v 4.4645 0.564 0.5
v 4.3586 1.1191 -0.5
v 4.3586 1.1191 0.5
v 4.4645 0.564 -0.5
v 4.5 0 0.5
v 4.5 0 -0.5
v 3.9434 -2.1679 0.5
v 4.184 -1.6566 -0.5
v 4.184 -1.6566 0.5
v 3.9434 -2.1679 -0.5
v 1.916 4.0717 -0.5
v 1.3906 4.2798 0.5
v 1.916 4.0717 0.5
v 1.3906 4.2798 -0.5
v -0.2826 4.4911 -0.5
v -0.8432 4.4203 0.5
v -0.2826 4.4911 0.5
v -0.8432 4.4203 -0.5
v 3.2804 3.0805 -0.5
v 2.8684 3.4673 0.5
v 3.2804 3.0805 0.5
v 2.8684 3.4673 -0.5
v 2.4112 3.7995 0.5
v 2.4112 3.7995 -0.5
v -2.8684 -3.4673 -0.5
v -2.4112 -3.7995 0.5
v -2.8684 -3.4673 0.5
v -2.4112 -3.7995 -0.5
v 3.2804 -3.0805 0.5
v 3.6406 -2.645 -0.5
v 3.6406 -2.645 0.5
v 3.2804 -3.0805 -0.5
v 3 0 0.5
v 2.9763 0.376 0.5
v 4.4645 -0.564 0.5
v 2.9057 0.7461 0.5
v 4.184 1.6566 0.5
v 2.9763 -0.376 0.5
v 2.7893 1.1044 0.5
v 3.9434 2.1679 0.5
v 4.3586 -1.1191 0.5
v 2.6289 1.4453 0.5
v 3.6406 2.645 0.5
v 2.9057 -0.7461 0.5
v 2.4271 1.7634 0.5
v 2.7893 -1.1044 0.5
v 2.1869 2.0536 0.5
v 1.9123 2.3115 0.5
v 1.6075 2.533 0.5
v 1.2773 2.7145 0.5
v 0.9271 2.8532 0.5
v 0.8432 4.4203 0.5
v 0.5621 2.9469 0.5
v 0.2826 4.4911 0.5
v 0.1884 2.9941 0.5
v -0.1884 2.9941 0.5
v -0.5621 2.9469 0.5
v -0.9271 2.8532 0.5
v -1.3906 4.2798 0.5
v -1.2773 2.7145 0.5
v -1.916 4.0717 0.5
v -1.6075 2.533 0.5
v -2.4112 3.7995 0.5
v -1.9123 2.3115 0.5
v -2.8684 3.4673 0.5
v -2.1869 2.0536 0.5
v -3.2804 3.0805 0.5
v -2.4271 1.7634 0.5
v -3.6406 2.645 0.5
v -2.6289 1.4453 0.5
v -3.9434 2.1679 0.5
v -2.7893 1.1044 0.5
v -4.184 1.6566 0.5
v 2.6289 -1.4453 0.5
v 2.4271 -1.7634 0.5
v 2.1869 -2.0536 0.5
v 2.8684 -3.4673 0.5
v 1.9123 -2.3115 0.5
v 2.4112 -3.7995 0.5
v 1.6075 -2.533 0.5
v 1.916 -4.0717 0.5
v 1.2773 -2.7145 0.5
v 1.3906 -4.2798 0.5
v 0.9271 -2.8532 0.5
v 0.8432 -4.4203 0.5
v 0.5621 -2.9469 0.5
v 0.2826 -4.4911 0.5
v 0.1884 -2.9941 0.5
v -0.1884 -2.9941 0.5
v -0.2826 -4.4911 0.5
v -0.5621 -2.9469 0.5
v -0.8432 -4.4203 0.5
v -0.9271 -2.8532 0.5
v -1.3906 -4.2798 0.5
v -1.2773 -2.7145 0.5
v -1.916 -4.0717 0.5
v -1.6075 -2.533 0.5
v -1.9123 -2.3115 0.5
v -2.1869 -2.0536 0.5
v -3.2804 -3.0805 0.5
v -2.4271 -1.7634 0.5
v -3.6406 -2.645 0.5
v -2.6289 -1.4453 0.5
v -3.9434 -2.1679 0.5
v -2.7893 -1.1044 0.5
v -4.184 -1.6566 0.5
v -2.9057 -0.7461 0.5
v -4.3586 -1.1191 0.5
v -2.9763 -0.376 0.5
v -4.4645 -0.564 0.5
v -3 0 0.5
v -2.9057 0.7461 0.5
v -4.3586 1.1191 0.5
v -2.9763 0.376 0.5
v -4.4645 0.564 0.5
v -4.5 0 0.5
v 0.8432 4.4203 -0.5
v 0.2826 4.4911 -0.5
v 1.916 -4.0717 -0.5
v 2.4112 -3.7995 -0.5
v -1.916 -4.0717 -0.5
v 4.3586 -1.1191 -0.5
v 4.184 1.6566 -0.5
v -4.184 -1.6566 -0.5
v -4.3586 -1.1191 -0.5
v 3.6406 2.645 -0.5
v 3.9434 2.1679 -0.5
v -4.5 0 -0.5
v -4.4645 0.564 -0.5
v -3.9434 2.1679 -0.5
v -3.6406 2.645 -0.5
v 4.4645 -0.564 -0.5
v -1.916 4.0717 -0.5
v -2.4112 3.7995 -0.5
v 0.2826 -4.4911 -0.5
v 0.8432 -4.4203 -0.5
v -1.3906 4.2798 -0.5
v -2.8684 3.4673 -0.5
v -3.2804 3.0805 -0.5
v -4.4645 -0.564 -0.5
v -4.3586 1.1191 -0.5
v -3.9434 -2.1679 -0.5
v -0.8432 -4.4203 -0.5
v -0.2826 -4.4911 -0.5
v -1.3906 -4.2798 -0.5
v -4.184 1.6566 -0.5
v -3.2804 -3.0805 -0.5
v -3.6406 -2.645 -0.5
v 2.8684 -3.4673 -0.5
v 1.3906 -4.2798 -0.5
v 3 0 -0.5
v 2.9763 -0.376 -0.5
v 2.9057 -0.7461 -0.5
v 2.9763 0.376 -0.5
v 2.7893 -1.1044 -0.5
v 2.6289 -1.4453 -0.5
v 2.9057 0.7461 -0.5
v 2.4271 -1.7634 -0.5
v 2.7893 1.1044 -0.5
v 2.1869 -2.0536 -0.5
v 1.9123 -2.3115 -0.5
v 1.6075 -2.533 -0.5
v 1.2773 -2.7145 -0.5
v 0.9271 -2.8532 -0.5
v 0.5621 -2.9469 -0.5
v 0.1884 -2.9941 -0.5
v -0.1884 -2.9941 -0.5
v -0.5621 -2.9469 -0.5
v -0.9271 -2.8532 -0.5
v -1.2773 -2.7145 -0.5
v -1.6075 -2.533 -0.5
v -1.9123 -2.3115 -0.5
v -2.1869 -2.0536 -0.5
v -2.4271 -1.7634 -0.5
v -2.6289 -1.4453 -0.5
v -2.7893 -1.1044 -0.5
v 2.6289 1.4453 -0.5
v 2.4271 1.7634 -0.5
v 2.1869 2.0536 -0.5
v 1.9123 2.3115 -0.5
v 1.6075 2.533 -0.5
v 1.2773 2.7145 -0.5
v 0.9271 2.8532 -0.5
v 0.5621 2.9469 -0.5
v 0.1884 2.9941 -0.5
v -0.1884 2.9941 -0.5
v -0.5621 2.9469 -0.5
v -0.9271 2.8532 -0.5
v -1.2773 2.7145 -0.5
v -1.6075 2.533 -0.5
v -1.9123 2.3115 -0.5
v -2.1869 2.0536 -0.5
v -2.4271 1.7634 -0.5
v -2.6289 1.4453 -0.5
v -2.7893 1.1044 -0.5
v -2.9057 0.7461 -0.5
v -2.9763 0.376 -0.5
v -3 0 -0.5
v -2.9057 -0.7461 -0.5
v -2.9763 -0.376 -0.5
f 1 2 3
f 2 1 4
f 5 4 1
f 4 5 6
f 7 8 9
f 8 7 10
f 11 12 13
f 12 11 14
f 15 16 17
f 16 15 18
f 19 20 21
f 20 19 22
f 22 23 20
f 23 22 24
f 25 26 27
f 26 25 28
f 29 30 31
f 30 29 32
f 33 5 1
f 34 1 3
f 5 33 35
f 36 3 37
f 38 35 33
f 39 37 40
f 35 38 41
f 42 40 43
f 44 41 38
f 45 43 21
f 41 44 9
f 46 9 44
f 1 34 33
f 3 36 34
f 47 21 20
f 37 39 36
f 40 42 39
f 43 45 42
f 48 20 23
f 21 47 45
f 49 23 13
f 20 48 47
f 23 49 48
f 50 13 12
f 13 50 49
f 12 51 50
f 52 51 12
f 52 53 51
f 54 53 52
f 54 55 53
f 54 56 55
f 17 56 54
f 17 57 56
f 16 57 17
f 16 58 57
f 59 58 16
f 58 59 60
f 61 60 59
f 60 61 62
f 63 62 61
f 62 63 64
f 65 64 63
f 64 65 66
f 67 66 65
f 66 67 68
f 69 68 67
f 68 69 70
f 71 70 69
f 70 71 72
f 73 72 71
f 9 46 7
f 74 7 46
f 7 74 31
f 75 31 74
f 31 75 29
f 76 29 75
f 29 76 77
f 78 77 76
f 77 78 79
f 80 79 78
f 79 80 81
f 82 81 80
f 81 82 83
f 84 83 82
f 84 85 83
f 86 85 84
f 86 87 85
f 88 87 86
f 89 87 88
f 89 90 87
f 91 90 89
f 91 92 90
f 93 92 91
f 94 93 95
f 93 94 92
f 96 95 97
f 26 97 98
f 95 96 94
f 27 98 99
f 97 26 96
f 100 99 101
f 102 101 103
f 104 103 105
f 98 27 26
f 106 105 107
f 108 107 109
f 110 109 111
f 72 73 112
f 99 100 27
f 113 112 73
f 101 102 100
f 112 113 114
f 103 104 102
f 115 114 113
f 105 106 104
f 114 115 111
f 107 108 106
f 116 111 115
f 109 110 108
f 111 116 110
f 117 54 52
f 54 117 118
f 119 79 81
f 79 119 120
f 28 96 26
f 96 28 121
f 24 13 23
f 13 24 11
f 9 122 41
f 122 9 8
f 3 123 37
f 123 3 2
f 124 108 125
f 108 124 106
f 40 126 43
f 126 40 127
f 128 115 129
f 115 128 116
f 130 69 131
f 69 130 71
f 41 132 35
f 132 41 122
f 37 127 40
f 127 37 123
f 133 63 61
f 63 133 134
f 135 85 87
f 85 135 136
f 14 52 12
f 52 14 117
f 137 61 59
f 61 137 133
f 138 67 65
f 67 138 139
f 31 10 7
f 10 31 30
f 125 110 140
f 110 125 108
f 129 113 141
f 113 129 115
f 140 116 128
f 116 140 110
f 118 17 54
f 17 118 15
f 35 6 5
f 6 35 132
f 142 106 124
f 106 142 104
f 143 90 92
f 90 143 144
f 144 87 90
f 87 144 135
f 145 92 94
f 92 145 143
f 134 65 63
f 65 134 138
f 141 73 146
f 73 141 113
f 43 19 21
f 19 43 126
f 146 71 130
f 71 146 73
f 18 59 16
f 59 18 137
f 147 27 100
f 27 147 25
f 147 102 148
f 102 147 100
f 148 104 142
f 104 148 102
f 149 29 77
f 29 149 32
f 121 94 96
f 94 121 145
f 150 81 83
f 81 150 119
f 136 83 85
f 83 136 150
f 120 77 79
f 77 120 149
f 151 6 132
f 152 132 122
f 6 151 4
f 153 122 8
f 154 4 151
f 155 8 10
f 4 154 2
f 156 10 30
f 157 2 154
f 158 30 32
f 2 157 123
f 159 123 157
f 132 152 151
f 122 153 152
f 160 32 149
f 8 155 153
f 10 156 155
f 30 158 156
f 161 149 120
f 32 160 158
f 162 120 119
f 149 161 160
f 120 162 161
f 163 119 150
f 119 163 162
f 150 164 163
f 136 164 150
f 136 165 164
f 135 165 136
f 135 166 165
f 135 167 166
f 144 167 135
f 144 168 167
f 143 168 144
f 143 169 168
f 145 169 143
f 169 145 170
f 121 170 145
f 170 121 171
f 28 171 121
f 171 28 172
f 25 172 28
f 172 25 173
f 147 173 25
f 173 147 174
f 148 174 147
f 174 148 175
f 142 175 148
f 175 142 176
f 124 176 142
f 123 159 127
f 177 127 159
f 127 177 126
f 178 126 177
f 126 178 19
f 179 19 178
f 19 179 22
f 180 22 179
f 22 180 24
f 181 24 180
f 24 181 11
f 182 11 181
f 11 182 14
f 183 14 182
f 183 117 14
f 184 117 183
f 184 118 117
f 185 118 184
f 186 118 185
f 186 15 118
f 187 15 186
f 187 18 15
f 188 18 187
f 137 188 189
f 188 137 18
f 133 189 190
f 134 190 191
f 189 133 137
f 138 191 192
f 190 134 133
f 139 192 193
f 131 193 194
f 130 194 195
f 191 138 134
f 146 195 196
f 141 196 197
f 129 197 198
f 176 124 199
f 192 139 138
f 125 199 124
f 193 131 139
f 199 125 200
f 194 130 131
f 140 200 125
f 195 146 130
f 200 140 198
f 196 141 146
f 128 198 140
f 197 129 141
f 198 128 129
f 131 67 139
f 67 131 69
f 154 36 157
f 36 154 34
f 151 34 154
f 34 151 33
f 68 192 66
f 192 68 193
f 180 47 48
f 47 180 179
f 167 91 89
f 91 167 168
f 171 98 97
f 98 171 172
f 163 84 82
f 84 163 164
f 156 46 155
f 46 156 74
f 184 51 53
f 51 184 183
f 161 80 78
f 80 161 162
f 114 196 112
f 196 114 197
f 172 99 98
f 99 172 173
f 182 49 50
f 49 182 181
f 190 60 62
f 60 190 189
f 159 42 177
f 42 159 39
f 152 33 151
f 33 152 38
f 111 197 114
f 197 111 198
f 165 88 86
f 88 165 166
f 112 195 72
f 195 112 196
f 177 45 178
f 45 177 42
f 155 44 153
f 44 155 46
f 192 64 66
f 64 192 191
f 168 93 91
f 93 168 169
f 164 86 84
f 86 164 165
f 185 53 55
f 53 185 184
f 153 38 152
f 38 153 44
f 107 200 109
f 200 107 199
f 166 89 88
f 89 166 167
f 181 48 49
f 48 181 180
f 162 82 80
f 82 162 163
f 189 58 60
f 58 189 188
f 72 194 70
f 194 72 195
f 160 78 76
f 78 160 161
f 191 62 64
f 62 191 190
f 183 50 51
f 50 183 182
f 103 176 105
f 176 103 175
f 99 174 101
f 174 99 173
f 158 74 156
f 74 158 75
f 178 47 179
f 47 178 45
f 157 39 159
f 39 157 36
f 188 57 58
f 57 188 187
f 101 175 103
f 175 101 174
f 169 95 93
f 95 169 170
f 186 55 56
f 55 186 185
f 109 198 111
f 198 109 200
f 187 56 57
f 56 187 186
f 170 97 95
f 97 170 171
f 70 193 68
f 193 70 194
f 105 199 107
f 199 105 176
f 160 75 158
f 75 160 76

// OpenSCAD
$fn = 50;


difference() {
	union() {
		translate(v = [0, 0, -0.5000000000]) {
			cylinder(h = 1, r = 4.5000000000);
		}
	}
	union() {
		translate(v = [0, 0, -100.0000000000]) {
			cylinder(h = 200, r = 3.0000000000);
		}
	}
}
